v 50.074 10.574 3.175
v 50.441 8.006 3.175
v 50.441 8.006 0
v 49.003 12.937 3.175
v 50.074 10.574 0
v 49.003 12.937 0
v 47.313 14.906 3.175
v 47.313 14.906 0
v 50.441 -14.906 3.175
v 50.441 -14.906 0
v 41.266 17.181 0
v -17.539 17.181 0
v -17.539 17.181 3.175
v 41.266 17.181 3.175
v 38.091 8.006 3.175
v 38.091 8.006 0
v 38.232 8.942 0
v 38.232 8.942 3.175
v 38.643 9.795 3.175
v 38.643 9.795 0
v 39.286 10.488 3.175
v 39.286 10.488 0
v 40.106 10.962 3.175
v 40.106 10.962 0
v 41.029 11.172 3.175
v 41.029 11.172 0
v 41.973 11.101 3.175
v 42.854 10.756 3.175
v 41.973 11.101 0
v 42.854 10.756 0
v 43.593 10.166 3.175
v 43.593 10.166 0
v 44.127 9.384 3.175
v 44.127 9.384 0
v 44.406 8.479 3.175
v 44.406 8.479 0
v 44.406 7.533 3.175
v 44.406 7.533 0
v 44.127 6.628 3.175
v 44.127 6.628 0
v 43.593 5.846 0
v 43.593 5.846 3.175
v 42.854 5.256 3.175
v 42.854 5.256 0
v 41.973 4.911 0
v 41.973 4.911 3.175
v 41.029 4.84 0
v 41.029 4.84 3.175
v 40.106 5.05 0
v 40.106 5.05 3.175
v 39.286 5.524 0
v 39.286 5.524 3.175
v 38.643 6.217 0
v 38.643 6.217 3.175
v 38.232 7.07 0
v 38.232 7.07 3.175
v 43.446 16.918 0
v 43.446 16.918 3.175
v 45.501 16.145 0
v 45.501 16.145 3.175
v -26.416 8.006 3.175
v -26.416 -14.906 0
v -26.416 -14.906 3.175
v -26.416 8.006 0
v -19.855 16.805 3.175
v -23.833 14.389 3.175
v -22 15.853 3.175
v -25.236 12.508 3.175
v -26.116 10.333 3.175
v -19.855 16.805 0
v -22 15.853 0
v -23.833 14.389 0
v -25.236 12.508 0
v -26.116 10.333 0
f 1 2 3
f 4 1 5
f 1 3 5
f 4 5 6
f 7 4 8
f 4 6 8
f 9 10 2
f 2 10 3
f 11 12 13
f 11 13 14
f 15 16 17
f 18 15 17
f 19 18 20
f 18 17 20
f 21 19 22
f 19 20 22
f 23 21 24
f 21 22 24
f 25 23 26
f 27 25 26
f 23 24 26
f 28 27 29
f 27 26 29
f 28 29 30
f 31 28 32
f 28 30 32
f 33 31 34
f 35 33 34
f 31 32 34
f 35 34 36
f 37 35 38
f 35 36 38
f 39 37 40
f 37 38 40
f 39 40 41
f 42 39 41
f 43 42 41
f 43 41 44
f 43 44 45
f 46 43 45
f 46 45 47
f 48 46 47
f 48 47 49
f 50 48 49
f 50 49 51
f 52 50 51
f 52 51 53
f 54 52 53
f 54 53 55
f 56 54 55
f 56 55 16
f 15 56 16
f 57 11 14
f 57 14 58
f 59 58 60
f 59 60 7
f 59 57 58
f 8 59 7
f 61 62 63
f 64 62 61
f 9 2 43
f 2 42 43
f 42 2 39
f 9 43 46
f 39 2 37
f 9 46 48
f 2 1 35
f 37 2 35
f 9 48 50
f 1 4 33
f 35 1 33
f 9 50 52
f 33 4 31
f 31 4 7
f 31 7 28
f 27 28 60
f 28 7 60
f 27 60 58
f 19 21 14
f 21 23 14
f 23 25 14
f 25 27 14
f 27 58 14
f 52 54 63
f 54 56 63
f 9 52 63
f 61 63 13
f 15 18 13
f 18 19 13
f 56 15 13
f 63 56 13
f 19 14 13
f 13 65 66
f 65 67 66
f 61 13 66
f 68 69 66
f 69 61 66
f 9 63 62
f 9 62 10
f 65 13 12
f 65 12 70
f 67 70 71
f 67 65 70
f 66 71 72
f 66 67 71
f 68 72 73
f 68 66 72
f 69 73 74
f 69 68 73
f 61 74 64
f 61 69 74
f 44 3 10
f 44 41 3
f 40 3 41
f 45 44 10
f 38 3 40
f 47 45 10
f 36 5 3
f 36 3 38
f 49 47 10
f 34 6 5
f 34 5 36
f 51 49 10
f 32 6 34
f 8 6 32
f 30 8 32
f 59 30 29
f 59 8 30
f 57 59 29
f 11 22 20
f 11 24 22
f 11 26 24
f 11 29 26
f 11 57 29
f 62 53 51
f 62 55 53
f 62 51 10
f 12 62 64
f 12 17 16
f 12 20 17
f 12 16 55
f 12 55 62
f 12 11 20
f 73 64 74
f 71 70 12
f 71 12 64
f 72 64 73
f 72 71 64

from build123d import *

# Parameters (mm, degrees)
SKETCH1_W           = 6.477
SKETCH1_H           = 19.812
SKETCH1_R           = 1.5
SKETCH1_W_2         = 52.832
SKETCH1_H_2         = 5
BOSS_EXTRUDE2_DEPTH = 3.175
SKETCH3_W           = 30
SKETCH3_H           = 29.812
BOSS_EXTRUDE3_DEPTH = 3.175
SKETCH4_R           = 3.175
CUT_EXTRUDE1_DEPTH  = 10
SKETCH5_W           = 56.703294506
SKETCH5_H           = 29.812
BOSS_EXTRUDE4_DEPTH = 3.175
BOSS_EXTRUDE6_DEPTH = 3.175
CUT_EXTRUDE3_DEPTH  = 10
SKETCH11_R          = 3.175
BOSS_EXTRUDE7_DEPTH = 3.175
CUT_EXTRUDE4_START  = -3.175
CUT_EXTRUDE4_DEPTH  = 3.175
SKETCH13_R          = 3.175
BOSS_EXTRUDE8_DEPTH = 3.175


# Read off the part's stored shape, not the designer's step: Cut-Extrude4
with BuildPart() as part:
    # Sketch1 → Boss-Extrude2 (new body)
    # profile 1 of 4: a face of its own
    with BuildSketch(Plane.XY):
        with Locations((-23.1775, 0)):
            Rectangle(SKETCH1_W, SKETCH1_H)
        with Locations((-23.622, -5.08)):
            Circle(SKETCH1_R, mode=Mode.SUBTRACT)
        with Locations((-23.622, 5.08)):
            Circle(SKETCH1_R, mode=Mode.SUBTRACT)
    # profile 2 of 4: a face of its own
    with BuildSketch(Plane.XY):
        with Locations((23.1775, 0)):
            Rectangle(SKETCH1_W, SKETCH1_H)
        with Locations((23.622, -5.08)):
            Circle(SKETCH1_R, mode=Mode.SUBTRACT)
        with Locations((23.622, 5.08)):
            Circle(SKETCH1_R, mode=Mode.SUBTRACT)
    # profile 3 of 4: a face of its own
    with BuildSketch(Plane.XY):
        with Locations((0, 12.406)):
            Rectangle(SKETCH1_W_2, SKETCH1_H_2)
    # profile 4 of 4: a face of its own
    with BuildSketch(Plane.XY):
        with Locations((0, -12.406)):
            Rectangle(SKETCH1_W_2, SKETCH1_H_2)
    extrude(amount=BOSS_EXTRUDE2_DEPTH)

    # Sketch3 → Boss-Extrude3 (add)
    with BuildSketch(Plane.XY.offset(3.175)):
        with Locations((41.416, 0)):
            Rectangle(SKETCH3_W, SKETCH3_H)
    extrude(amount=-BOSS_EXTRUDE3_DEPTH)

    # Sketch4 → Cut-Extrude1 (cut)
    with BuildSketch(Plane(origin=(0, 0, 0), x_dir=(-1, 0, 0), z_dir=(0, 0, -1))):
        with Locations((-41.266, 8.006)):
            Circle(SKETCH4_R)
    extrude(amount=-CUT_EXTRUDE1_DEPTH, mode=Mode.SUBTRACT)

    # Sketch5 → Boss-Extrude4 (add)
    with BuildSketch(Plane(origin=(0, 0, 0), x_dir=(-1, 0, 0), z_dir=(0, 0, -1))):
        with Locations((-1.935647253, 0)):
            Rectangle(SKETCH5_W, SKETCH5_H)
    extrude(amount=-BOSS_EXTRUDE4_DEPTH)

    # Sketch8 → Boss-Extrude6 (add)
    with BuildSketch(Plane(origin=(0, 0, 0), x_dir=(-1, 0, 0), z_dir=(0, 0, -1))):
        with BuildLine():
            ThreePointArc((-21.596379237, 14.906), (-31.366874619, 16.599566662), (-41.266, 17.181))
            ThreePointArc((-41.266, 17.181), (-44.496566901, 16.593436317), (-47.313365129, 14.906))
            Line((-47.313365129, 14.906), (-21.596379237, 14.906))
        make_face()
    extrude(amount=-BOSS_EXTRUDE6_DEPTH)

    # Sketch9 → Cut-Extrude3 (cut)
    with BuildSketch(Plane(origin=(0, 0, 0), x_dir=(-1, 0, 0), z_dir=(0, 0, -1))):
        with BuildLine():
            Line((-50.441, -14.906), (-50.441, 8.006))
            ThreePointArc((-50.441, 8.006), (-49.622590215, 11.79387869), (-47.313365129, 14.906))
            Line((-47.313365129, 14.906), (-56.416, 14.906))
            Line((-56.416, 14.906), (-56.416, -14.906))
            Line((-56.416, -14.906), (-50.441, -14.906))
        make_face()
        with BuildLine():
            ThreePointArc((-21.596379237, 14.906), (4.87312141, 3.967175073), (26.416, -14.906))
            Line((26.416, -14.906), (26.416, 14.906))
            Line((26.416, 14.906), (-21.596379237, 14.906))
        make_face()
    extrude(amount=-CUT_EXTRUDE3_DEPTH, mode=Mode.SUBTRACT)

    # Sketch11 → Boss-Extrude7 (add)
    with BuildSketch(Plane(origin=(0, 0, 0), x_dir=(-1, 0, 0), z_dir=(0, 0, -1))):
        with BuildLine():
            ThreePointArc((-41.266, 17.181), (-3.83303759, 8.714126043), (26.416, -14.906))
            Line((26.416, -14.906), (26.416, 17.181))
            Line((26.416, 17.181), (-41.266, 17.181))
        make_face()
        with Locations((17.236, 8.006)):
            Circle(SKETCH11_R, mode=Mode.SUBTRACT)
    extrude(amount=-BOSS_EXTRUDE7_DEPTH)

    # Cut-Extrude4 outline → Cut-Extrude4 (cut)
    with BuildSketch(Plane(origin=(0, 0, 0), x_dir=(-1, 0, 0), z_dir=(0, 0, -1)).offset(CUT_EXTRUDE4_START)):
        with BuildLine():
            ThreePointArc((17.538943889, 17.181), (23.833477734, 14.389234881), (26.416, 8.006))
            Line((26.416, 8.006), (26.416, 17.181))
            Line((26.416, 17.181), (17.538943889, 17.181))
        make_face()
    extrude(amount=CUT_EXTRUDE4_DEPTH, mode=Mode.SUBTRACT)

    # Sketch13 → Boss-Extrude8 (add)
    with BuildSketch(Plane(origin=(0, 0, 0), x_dir=(-1, 0, 0), z_dir=(0, 0, -1))):
        with Locations((17.236, 8.006)):
            Circle(SKETCH13_R)
    extrude(amount=-BOSS_EXTRUDE8_DEPTH)


solid = part.part
